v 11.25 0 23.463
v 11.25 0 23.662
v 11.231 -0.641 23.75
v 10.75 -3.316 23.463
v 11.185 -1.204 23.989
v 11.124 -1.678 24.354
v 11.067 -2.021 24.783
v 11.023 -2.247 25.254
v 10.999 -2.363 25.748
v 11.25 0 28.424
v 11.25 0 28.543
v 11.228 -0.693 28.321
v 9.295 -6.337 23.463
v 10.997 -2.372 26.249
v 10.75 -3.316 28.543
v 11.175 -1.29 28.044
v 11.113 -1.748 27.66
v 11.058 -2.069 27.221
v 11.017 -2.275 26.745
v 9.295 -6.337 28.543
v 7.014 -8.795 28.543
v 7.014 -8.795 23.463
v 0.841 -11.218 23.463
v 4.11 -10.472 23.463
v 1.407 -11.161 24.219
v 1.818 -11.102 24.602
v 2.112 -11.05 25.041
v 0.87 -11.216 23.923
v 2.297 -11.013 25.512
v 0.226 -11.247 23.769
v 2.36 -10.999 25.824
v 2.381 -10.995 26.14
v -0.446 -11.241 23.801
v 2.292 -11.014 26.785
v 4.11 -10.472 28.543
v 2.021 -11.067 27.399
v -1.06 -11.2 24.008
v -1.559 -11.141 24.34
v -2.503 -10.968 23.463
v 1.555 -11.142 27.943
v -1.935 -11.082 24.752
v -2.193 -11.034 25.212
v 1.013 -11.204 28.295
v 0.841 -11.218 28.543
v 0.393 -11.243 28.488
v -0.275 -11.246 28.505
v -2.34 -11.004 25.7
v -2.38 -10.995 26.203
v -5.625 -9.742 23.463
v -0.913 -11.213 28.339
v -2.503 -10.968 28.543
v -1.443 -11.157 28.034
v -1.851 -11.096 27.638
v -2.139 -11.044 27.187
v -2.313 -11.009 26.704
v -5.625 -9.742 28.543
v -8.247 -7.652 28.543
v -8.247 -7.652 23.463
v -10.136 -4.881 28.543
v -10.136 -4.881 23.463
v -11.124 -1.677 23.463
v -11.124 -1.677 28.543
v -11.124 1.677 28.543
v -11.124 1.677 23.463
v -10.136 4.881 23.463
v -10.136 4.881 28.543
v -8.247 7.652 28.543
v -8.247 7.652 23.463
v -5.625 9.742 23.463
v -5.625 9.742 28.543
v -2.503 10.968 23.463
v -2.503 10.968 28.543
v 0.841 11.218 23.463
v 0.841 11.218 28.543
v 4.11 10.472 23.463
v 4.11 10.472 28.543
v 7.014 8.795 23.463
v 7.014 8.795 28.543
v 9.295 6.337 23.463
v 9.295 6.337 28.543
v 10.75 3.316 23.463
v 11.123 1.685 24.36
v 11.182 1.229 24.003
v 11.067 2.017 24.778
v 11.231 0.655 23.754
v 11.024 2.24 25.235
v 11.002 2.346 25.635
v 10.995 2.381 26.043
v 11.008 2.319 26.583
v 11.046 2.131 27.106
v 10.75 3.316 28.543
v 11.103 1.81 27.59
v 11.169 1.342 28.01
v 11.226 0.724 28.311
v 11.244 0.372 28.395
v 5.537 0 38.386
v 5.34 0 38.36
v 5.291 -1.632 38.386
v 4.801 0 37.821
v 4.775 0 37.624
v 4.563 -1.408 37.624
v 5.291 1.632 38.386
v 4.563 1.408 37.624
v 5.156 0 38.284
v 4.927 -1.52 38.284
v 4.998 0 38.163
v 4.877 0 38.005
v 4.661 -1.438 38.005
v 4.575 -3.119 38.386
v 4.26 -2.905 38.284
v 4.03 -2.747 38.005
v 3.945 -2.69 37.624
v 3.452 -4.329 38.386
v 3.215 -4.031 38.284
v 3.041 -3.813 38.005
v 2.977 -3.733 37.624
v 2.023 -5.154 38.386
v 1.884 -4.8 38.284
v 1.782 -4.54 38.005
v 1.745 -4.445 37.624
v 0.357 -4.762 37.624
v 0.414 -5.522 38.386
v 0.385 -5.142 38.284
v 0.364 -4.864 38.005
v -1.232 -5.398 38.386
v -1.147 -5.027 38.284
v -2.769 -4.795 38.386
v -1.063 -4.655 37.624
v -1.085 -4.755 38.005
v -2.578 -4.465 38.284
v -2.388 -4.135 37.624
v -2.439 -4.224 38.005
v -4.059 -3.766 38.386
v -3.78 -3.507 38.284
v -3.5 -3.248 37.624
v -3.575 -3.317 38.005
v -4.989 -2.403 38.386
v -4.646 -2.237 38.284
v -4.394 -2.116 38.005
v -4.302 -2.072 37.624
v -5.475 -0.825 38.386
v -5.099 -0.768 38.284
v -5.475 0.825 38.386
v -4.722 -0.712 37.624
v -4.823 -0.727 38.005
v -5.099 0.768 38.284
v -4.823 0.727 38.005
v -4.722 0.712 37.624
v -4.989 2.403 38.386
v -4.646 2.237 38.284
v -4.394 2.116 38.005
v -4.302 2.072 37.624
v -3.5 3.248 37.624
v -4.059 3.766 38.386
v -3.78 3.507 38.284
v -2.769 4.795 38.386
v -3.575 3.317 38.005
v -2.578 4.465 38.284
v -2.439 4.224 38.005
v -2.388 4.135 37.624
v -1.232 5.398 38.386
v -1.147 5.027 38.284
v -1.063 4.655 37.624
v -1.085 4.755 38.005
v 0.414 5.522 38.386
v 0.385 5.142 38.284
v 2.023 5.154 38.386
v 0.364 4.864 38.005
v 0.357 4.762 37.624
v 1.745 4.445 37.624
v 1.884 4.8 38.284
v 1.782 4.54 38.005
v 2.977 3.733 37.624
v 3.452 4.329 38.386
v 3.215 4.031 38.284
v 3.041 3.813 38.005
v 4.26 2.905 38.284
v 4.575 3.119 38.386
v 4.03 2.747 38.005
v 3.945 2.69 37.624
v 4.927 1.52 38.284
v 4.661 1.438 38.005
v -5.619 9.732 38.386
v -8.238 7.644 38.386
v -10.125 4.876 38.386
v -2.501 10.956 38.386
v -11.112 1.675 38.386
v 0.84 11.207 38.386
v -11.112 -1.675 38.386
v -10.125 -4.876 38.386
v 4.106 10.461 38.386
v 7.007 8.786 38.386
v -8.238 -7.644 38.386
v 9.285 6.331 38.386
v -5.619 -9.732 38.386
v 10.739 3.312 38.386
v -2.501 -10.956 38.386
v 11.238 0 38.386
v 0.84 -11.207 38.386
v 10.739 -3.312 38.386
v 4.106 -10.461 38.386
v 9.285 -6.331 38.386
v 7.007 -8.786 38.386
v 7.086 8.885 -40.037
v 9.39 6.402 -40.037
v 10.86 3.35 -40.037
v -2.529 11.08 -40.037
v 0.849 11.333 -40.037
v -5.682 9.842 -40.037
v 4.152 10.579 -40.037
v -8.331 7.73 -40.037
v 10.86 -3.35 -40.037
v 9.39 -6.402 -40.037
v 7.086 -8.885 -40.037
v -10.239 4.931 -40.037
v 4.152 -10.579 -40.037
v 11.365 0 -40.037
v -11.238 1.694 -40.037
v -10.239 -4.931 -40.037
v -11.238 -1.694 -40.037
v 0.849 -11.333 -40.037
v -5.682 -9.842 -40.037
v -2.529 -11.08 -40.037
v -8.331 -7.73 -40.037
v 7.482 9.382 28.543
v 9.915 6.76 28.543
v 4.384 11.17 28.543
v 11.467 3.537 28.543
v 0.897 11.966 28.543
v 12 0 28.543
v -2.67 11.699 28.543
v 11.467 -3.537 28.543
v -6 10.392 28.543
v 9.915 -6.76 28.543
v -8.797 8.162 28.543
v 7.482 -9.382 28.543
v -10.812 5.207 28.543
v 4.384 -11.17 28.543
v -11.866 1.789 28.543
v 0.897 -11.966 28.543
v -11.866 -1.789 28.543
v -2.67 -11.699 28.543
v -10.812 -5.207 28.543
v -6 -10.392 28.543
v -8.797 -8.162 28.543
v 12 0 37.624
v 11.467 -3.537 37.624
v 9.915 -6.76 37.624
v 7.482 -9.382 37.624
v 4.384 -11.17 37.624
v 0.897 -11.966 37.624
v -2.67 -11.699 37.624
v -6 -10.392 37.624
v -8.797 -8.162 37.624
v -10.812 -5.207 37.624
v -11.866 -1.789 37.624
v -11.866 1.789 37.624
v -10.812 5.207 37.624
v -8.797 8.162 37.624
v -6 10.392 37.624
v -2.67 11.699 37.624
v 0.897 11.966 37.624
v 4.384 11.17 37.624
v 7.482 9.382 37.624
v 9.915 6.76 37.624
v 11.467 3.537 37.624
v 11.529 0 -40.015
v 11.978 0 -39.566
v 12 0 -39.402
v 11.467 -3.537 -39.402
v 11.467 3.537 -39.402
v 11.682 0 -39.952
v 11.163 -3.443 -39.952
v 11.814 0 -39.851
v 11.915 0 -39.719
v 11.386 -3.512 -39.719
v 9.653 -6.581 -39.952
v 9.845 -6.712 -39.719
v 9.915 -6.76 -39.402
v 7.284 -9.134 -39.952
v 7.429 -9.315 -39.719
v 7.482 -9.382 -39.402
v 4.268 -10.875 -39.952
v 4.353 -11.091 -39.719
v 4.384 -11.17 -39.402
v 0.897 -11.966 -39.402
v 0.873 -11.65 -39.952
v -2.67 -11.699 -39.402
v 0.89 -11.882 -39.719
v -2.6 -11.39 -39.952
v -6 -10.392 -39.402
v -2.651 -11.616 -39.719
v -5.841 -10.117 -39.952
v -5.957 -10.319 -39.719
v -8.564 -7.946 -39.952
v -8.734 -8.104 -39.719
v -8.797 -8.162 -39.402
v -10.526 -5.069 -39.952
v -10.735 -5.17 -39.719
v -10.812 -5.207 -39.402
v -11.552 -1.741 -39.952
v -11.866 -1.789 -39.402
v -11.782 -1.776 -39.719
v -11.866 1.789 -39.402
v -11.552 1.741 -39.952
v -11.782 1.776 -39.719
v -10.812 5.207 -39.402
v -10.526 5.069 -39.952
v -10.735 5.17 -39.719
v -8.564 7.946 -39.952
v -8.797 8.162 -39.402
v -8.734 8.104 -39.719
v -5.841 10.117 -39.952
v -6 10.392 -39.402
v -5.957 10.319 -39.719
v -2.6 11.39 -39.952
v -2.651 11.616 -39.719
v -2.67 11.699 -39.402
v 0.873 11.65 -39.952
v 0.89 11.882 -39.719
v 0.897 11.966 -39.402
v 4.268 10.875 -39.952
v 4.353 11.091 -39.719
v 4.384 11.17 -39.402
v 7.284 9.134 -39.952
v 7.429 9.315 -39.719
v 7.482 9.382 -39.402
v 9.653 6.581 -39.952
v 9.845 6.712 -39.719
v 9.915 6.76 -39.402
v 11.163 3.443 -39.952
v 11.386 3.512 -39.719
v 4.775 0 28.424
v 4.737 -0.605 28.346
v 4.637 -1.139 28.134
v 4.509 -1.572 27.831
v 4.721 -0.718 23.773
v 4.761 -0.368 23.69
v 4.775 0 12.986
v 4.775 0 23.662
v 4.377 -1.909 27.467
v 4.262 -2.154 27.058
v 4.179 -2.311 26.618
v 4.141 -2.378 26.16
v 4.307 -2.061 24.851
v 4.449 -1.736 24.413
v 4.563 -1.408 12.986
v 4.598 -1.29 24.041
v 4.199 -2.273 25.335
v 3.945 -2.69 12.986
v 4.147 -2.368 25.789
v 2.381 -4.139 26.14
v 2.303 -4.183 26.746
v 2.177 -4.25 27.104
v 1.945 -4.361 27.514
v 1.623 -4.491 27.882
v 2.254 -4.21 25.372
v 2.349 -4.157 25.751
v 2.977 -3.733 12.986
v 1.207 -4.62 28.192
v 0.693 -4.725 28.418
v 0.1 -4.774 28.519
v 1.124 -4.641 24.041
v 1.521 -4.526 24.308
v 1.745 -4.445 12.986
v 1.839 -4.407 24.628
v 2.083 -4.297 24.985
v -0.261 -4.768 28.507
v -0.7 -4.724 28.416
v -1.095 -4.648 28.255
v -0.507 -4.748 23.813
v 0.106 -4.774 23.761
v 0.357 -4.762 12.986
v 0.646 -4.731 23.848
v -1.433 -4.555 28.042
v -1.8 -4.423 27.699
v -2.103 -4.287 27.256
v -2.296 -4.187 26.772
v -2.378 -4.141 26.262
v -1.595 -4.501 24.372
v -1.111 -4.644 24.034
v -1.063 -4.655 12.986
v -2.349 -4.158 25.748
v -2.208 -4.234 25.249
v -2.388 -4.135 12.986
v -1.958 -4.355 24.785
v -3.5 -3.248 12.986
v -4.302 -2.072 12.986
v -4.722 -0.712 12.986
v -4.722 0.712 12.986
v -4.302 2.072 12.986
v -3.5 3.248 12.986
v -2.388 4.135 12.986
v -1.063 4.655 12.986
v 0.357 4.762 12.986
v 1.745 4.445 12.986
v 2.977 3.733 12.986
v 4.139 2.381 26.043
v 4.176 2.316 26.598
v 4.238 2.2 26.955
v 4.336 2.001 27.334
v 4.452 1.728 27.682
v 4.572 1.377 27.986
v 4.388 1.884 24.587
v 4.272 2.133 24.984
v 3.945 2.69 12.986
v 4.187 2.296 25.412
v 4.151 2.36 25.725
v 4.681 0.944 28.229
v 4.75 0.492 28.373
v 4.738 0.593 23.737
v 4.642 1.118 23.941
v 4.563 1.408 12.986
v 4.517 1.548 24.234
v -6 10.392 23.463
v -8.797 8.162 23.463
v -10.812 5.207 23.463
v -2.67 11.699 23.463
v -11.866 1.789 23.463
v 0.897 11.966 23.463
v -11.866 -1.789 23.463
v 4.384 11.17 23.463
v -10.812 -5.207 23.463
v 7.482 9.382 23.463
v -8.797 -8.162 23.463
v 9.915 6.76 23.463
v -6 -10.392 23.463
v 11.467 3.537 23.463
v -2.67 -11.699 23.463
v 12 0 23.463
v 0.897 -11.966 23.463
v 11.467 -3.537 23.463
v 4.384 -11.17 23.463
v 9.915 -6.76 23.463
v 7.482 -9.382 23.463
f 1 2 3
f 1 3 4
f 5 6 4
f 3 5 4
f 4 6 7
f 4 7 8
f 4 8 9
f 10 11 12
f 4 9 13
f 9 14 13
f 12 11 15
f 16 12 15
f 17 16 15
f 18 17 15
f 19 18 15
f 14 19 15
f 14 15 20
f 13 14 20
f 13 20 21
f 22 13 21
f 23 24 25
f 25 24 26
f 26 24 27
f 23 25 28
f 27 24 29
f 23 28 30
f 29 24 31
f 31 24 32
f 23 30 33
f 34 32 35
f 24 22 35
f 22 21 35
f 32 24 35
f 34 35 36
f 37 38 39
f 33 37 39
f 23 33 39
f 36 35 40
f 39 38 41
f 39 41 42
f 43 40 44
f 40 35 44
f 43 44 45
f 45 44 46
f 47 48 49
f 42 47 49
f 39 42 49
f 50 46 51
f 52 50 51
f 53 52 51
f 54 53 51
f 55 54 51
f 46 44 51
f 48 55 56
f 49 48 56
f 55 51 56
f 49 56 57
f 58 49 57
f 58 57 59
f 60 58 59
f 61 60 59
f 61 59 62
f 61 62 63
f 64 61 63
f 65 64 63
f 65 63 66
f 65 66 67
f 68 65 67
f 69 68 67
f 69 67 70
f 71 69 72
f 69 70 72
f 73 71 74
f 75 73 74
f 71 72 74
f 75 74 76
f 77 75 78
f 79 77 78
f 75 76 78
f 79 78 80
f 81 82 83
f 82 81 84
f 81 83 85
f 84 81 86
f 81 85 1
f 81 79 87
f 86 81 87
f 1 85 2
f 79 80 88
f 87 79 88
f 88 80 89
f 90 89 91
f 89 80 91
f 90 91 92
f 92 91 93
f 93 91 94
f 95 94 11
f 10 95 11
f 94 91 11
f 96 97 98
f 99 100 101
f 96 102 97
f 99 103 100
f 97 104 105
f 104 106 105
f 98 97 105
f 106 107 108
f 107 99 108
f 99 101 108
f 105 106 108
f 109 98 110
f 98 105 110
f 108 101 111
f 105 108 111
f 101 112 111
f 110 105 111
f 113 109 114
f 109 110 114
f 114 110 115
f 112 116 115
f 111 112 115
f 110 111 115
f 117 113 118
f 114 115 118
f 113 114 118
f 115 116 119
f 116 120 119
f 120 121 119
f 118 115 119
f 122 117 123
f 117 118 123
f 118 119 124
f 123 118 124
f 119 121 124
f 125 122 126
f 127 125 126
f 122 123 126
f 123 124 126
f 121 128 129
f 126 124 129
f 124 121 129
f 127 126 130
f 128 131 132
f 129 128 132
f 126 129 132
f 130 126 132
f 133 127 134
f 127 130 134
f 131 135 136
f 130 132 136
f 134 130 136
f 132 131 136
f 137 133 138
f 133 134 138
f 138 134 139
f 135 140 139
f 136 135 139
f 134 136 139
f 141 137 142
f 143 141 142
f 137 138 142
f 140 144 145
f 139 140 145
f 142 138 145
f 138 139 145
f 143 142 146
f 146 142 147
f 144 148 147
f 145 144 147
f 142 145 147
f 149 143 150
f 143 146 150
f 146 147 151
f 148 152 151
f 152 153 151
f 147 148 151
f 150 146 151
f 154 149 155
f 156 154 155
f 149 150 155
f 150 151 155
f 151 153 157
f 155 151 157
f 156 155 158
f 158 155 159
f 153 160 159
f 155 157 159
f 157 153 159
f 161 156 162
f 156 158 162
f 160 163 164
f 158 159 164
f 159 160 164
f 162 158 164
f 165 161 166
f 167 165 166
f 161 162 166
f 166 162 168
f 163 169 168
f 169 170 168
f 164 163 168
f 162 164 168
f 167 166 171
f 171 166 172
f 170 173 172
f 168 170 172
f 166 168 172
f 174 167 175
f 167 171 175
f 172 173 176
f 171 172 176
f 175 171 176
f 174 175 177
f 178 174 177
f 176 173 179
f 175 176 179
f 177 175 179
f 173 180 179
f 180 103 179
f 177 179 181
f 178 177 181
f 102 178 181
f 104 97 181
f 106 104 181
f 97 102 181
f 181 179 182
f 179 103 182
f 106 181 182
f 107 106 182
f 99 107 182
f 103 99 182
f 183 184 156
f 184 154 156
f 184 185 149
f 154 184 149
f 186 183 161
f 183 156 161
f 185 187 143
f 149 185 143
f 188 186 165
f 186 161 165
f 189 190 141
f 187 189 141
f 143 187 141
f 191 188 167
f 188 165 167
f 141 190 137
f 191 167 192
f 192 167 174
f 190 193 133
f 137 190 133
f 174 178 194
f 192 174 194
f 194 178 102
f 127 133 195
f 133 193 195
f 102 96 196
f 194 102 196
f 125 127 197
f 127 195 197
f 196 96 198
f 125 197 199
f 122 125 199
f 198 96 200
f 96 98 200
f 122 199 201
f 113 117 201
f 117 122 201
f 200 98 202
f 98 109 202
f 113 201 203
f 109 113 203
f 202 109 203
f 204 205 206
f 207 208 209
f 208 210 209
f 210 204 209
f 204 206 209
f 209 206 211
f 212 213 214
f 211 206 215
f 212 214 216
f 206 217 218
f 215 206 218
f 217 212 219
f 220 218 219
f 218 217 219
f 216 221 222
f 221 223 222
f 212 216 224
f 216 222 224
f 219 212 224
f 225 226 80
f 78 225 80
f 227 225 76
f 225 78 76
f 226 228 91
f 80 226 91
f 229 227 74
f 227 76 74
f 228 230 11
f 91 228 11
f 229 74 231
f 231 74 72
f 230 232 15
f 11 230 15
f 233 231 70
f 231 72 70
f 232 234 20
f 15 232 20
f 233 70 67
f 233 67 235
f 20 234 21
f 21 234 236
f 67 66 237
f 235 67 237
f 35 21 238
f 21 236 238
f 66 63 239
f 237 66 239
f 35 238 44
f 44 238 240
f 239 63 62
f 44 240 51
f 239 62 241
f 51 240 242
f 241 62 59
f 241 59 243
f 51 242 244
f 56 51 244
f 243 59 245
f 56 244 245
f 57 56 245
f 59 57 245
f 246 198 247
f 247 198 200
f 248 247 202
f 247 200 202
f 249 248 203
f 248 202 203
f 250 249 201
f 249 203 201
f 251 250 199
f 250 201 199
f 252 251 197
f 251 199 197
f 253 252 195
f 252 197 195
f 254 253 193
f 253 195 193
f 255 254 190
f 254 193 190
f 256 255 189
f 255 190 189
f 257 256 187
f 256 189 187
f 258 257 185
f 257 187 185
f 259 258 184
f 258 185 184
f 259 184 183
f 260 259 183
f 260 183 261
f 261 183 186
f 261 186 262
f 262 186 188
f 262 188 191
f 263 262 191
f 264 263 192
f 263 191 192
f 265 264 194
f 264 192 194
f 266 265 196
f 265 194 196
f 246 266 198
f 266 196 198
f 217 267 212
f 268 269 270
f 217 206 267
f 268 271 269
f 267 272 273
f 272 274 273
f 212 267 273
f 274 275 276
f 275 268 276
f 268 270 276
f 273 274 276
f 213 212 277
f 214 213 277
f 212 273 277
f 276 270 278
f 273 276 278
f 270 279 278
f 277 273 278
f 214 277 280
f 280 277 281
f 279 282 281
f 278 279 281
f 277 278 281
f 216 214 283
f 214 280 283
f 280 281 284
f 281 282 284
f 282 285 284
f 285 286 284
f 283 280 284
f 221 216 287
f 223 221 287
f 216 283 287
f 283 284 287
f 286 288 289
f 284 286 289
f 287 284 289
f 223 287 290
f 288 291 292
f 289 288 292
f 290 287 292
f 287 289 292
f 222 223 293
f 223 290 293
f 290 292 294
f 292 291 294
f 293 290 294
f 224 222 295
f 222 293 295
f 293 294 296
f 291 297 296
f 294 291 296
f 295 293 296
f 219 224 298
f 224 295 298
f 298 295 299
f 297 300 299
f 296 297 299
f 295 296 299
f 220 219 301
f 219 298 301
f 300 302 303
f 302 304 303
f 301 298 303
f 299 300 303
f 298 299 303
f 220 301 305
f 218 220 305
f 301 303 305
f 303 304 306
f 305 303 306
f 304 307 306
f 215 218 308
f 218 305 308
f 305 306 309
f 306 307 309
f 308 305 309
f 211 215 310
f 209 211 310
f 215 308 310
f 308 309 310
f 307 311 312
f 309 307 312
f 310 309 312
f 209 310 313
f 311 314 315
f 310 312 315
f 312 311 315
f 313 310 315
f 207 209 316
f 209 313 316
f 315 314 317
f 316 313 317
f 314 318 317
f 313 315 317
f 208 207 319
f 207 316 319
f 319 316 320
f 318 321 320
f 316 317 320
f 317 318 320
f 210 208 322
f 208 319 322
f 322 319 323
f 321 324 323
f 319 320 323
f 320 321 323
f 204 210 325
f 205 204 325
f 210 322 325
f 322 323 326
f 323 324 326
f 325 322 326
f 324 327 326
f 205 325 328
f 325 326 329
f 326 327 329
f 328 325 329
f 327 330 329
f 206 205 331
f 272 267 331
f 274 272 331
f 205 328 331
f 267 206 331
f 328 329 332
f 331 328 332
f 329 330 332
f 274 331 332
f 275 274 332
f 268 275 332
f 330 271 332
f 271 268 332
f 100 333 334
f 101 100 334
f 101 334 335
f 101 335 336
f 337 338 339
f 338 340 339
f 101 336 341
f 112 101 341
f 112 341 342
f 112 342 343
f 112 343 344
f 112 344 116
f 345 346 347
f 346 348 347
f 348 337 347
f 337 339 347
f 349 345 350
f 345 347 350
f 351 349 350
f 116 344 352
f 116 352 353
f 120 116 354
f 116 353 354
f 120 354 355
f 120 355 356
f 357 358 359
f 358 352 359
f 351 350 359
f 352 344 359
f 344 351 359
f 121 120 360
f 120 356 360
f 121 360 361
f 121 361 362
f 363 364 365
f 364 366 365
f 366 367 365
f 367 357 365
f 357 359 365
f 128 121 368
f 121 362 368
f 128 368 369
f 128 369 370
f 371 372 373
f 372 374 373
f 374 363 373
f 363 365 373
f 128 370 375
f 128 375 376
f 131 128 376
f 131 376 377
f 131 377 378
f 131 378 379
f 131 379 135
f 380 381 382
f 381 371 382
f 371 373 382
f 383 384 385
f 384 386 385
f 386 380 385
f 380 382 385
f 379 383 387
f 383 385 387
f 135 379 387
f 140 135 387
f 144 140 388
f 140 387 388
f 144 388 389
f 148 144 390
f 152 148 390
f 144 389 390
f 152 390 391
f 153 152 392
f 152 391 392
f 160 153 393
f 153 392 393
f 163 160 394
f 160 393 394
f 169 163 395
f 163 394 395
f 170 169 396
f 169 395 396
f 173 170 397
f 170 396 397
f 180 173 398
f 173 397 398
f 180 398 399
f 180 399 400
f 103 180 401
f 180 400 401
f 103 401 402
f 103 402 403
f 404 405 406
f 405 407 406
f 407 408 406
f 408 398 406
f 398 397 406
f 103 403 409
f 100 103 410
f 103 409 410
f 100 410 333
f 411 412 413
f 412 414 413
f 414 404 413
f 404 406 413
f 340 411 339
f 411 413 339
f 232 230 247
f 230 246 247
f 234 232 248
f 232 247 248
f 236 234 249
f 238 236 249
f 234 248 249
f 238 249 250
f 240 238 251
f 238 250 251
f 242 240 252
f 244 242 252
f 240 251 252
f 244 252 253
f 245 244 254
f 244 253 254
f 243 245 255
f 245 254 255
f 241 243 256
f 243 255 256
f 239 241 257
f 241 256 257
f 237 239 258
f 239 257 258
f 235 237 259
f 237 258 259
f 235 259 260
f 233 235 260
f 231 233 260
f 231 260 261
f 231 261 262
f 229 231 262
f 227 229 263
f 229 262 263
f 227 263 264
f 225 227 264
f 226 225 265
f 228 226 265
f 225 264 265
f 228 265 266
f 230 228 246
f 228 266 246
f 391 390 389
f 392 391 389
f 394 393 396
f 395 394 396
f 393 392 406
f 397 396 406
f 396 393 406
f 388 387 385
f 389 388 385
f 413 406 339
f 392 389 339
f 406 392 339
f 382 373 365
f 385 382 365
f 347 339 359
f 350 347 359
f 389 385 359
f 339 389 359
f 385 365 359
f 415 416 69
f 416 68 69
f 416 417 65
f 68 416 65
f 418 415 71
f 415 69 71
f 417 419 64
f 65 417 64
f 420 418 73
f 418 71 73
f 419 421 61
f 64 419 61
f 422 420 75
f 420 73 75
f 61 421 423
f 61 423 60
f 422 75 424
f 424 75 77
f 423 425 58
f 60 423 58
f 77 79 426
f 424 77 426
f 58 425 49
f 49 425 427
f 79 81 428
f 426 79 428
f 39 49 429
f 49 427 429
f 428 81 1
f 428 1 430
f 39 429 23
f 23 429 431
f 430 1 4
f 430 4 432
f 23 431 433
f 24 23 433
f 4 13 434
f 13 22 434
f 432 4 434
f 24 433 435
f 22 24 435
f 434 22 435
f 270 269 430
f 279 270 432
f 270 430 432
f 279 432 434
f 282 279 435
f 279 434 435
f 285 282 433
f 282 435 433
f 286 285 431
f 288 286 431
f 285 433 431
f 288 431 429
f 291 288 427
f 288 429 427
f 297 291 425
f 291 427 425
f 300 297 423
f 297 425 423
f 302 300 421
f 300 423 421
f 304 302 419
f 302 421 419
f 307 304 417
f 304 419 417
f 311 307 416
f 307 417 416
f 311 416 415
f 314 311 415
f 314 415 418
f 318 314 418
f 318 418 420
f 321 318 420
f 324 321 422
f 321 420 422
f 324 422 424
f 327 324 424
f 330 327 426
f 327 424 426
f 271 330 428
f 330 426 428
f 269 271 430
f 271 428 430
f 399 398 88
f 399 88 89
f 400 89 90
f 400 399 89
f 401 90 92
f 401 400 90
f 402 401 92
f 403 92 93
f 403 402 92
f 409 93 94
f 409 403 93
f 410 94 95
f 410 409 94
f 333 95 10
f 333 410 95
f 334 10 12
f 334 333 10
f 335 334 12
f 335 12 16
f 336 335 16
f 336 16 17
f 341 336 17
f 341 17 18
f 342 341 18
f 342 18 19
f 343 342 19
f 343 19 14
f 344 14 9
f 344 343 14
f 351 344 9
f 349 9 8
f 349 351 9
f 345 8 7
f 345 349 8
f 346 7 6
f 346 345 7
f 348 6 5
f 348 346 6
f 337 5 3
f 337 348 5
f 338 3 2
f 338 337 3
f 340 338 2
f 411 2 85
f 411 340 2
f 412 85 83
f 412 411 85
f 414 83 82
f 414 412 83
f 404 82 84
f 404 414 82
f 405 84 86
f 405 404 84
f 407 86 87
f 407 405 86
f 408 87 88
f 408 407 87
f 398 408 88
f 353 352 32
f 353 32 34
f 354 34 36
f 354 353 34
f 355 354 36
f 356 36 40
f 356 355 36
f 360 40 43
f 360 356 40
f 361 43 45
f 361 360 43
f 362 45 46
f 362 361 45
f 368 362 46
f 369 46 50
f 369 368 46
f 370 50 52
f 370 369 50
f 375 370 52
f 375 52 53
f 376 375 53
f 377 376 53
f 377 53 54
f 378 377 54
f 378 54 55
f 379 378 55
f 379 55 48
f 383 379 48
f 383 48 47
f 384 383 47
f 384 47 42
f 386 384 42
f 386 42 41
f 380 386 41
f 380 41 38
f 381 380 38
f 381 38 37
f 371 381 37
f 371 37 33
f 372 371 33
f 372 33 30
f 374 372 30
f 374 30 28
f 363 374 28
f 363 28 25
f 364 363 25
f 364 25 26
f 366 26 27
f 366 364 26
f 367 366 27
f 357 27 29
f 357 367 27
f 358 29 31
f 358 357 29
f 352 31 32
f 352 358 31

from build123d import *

# Parameters (mm, degrees)
F2_R     = 2.38125
F3_DEPTH = 25.4
F4_R     = 2.38125
F5_DEPTH = 25.4


with BuildPart() as f1:
    # F0 (on Front) → F1 (revolve)
    with BuildSketch(Plane.XZ):
        with BuildLine():
            Line((0, 12.985748), (0, -40.036752))
            Line((0, -40.036752), (11.364976, -40.036752))
            ThreePointArc((11.364976, -40.036752), (11.813989, -39.850765), (11.999976, -39.401752))
            Line((11.999976, -39.401752), (11.999976, 23.463248))
            Line((11.999976, 23.463248), (11.24966, 23.463248))
            Line((11.24966, 23.463248), (11.24966, 28.543248))
            Line((11.24966, 28.543248), (11.999976, 28.543248))
            Line((11.999976, 28.543248), (11.999976, 37.623748))
            Line((11.999976, 37.623748), (11.237976, 38.385748))
            Line((11.237976, 38.385748), (5.5372, 38.385748))
            ThreePointArc((5.5372, 38.385748), (4.998385, 38.162564), (4.7752, 37.623748))
            Line((4.7752, 37.623748), (4.7752, 12.985748))
            Line((4.7752, 12.985748), (0, 12.985748))
        make_face()
    revolve(axis=Axis((0, 0, -13.525502), (0, 0, -1)))

    # F2 (on Front) → F3 (cut)
    with BuildSketch(Plane.XZ):
        with Locations((0, 26.139926)):
            Circle(F2_R)
    extrude(amount=F3_DEPTH, mode=Mode.SUBTRACT)

    # F4 (on Right) → F5 (cut)
    with BuildSketch(Plane.YZ):
        with Locations((0, 26.043008)):
            Circle(F4_R)
    extrude(amount=F5_DEPTH, mode=Mode.SUBTRACT)


solid = f1.part
